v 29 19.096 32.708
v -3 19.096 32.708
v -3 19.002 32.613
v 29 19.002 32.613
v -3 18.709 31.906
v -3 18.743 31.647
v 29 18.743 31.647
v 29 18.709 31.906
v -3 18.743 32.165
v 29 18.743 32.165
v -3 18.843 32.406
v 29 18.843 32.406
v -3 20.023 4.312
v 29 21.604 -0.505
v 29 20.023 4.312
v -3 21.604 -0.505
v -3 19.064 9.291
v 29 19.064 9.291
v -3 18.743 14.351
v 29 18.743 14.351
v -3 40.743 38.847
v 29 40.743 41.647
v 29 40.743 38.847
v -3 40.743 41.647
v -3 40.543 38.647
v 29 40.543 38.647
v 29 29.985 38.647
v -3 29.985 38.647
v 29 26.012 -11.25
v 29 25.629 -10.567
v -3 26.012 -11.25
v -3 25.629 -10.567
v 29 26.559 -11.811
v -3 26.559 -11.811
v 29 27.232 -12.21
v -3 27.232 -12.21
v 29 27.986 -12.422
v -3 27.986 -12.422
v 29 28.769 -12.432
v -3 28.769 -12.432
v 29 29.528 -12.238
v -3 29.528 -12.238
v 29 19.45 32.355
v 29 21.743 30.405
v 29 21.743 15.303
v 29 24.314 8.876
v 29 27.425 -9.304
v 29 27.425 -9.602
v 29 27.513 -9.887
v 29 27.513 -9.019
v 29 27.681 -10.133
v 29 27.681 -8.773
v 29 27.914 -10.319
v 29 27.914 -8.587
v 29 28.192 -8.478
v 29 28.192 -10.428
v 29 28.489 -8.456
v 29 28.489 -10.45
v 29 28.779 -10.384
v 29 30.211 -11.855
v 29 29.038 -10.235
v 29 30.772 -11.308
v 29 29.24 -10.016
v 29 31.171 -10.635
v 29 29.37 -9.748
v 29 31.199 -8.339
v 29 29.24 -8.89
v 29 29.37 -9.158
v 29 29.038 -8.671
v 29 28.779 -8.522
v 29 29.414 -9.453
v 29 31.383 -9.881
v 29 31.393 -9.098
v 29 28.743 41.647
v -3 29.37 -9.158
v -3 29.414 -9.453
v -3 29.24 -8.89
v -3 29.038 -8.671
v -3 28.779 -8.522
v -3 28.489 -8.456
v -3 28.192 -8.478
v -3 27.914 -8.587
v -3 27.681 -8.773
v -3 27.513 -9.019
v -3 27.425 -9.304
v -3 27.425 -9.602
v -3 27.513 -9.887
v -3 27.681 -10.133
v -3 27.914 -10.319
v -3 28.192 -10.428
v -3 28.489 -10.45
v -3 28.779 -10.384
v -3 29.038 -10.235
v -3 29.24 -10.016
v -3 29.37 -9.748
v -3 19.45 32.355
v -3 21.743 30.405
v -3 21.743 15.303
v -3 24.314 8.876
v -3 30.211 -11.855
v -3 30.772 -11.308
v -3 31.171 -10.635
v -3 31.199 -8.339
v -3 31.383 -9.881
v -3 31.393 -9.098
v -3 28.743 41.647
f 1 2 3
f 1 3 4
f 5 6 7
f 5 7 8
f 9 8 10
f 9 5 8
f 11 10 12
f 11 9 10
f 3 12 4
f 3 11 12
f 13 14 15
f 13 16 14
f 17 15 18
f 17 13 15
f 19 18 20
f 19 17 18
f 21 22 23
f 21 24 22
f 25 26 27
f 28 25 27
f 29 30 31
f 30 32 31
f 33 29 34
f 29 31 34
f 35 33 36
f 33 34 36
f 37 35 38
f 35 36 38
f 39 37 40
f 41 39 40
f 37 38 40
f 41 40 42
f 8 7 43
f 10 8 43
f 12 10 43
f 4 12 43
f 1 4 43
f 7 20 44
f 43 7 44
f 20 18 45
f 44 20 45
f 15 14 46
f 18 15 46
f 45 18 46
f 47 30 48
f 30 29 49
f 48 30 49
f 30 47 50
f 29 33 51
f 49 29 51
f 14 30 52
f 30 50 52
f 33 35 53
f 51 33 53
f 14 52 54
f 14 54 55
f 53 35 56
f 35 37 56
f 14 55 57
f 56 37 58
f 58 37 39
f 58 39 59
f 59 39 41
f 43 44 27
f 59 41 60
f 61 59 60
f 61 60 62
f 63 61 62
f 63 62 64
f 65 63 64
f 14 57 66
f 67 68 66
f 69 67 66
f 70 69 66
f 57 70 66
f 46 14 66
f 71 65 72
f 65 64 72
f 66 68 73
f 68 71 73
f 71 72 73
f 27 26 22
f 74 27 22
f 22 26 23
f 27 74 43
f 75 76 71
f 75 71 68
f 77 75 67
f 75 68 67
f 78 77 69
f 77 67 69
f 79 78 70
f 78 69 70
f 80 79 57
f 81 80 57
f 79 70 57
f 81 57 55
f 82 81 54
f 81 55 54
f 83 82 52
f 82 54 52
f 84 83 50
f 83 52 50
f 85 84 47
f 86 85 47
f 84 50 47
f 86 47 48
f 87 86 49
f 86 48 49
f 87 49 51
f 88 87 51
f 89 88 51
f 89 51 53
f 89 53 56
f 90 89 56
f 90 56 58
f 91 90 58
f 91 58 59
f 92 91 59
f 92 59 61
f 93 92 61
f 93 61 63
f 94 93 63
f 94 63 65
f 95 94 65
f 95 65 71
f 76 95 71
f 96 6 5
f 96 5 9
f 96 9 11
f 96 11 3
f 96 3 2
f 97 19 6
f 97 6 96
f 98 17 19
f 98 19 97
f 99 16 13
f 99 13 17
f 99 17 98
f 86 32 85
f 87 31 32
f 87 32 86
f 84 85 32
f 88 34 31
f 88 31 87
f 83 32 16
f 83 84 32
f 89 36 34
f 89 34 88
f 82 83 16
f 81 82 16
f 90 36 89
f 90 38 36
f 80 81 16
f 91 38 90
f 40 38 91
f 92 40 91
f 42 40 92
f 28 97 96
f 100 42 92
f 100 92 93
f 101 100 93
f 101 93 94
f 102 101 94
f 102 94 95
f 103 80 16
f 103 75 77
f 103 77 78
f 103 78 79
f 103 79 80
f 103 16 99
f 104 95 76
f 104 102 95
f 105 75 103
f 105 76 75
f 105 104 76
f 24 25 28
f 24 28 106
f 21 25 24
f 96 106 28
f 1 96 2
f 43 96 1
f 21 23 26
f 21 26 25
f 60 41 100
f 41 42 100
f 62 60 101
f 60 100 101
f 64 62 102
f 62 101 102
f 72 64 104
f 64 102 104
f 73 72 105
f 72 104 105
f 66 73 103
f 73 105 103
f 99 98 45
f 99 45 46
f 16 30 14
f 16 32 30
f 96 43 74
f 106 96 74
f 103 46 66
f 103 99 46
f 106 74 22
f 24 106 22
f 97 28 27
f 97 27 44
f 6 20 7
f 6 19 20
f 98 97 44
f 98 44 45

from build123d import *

# Parameters (mm, degrees)
F0_W         = 3
F0_H         = 20
F1_DEPTH     = 10
F2_W         = 3
F2_H         = 20
F3_DEPTH     = 3
F4_DEPTH     = 10
F6_DEPTH     = 25
F7_DEPTH     = 29
F8_R         = 2.99999
F9_R         = 1
F10_DEPTH    = 100
F11_R        = 40
F12_W        = 32
F12_H        = 1
F13_DEPTH    = 0.5
F14_T1_DEPTH = 36.3301270189
F15_SIZE     = 0.2


# Not quite as in the source:
# - a fillet or chamfer that OpenCascade refuses, or shapes differently, is made with other operations: its cross-section is extruded or revolved along the edge and cut away or added
# - a fillet or chamfer is up to 0.001 mm smaller than in the source, because OpenCascade refuses the exact size


with BuildPart() as f1:
    # F0 (on Right) → F1 (new body)
    with BuildSketch(Plane.YZ):
        with Locations((42.2427766025, 31.6474299499)):
            Rectangle(F0_W, F0_H)
    extrude(amount=F1_DEPTH)

    # F2 (on face) → F3 (join)
    with BuildSketch(Plane(origin=(0, 0, 0), x_dir=(0, -1, 0), z_dir=(-1, 0, 0))):
        with Locations((-42.2427766025, 31.6474299499)):
            Rectangle(F2_W, F2_H)
        Polygon((-28.7427766025, 41.6474299499), (-40.7427766025, 41.6474299499), (-40.7427766025, 21.6474299499), (-43.7427766025, 21.6474299499), (-43.7427766025, -18.3525700501), (-28.7427766025, -18.3525700501), (-18.7427766025, 6.6474299499), (-18.7427766025, 31.6474299499), align=None)
    extrude(amount=F3_DEPTH)

    # F4 (cut): a face of the model
    f4_faces = [f1.faces().sort_by_distance(p)[0] for p in [
        (10, 42.2427766025, 31.6474299499),
    ]]
    extrude(f4_faces, amount=-F4_DEPTH, mode=Mode.SUBTRACT)

    # F5 (on face) → F6 (cut)
    with BuildSketch(Plane.YZ):
        Polygon((33.2049743711, -13.3525700501), (26.7427766025, -13.3525700501), (28.7427766025, -18.3525700501), (34.3136367478, -16.124225992), align=None)
        Polygon((41.2427766025, -13.3525700501), (33.2049743711, -13.3525700501), (34.3136367478, -16.124225992), align=None)
        Polygon((34.3136367478, -16.124225992), (28.7427766025, -18.3525700501), (43.7427766025, -18.3525700501), (43.7427766025, -13.3525700501), (41.2427766025, -13.3525700501), align=None)
        Polygon((40.7427766025, 21.6474299499), (43.7427766025, 21.6474299499), (43.7427766025, 41.6474299499), (40.7427766025, 41.6474299499), (40.7427766025, 38.6474299499), align=None)
        Polygon((32.3136367478, -11.124225992), (33.2049743711, -13.3525700501), (41.2427766025, -13.3525700501), (43.7427766025, -12.3525700501), (43.7427766025, 21.6474299499), (40.7427766025, 21.6474299499), (40.7427766025, 38.6474299499), (31.7427766025, 38.6474299499), (29.9854172896, 38.6474299499), (21.7427766025, 30.4047892628), (21.7427766025, 28.6474299499), (21.7427766025, 15.3029243713), (24.3136367478, 8.875774008), align=None)
        Polygon((43.7427766025, -12.3525700501), (41.2427766025, -13.3525700501), (43.7427766025, -13.3525700501), align=None)
        Polygon((32.3136367478, -11.124225992), (26.7427766025, -13.3525700501), (33.2049743711, -13.3525700501), align=None)
    extrude(amount=-F6_DEPTH, mode=Mode.SUBTRACT)

    # F7 (add): a face of the model
    f7_faces = [f1.faces().sort_by_distance(p)[0] for p in [
        (0, 34.7427766025, 41.0550618211),
    ]]
    extrude(f7_faces, amount=F7_DEPTH)

    # F8 (radius 3 in the source; OpenCascade refuses exactly that, so slightly less here)
    f8_edges = [f1.edges().sort_by_distance(p)[0] for p in [
        (13, 26.742777, -13.35257),
        (13, 32.313637, -11.124226),
    ]]
    fillet(f8_edges, radius=F8_R)

    # F9 (on face) → F10 (cut)
    with BuildSketch(Plane.YZ.offset(29)):
        with Locations((28.4140346461, -9.4529679484)):
            Circle(F9_R)
    extrude(amount=-F10_DEPTH, mode=Mode.SUBTRACT)

    # F11
    f11_edges = [f1.edges().sort_by_distance(p)[0] for p in [
        (13, 18.742777, 6.64743),
    ]]
    fillet(f11_edges, radius=F11_R)

    # F12 (on face) → F13 (join)
    with BuildSketch(Plane(origin=(0, -6.4523266737, 6.4523266737), x_dir=(1, 0, 0), z_dir=(0, -0.7071067812, 0.7071067812))):
        with Locations((13, 36.1312567586)):
            Rectangle(F12_W, F12_H)
    extrude(amount=F13_DEPTH)

    # F14: fillet of radius 1 on 1 edges, made by hand

    # F14_s2 → F14_t1 (cut)
    with BuildSketch(Plane.YZ.offset(-5.1650635095)):
        with BuildLine():
            ThreePointArc((18.7427766025, 31.6474299499), (18.7427766025, 32.1650680401), (19.0015956476, 32.6133557762))
            Line((19.0015956476, 32.6133557762), (18.3892232119, 32.0009833405))
            Line((18.3892232119, 32.0009833405), (18.7427766025, 31.6474299499))
        make_face()
    extrude(amount=F14_T1_DEPTH, mode=Mode.SUBTRACT)

    # F15
    f15_edges = [f1.edges().sort_by_distance(p)[0] for p in [
        (13, 40.742777, 38.64743),
    ]]
    chamfer(f15_edges, length=F15_SIZE)


solid = f1.part
